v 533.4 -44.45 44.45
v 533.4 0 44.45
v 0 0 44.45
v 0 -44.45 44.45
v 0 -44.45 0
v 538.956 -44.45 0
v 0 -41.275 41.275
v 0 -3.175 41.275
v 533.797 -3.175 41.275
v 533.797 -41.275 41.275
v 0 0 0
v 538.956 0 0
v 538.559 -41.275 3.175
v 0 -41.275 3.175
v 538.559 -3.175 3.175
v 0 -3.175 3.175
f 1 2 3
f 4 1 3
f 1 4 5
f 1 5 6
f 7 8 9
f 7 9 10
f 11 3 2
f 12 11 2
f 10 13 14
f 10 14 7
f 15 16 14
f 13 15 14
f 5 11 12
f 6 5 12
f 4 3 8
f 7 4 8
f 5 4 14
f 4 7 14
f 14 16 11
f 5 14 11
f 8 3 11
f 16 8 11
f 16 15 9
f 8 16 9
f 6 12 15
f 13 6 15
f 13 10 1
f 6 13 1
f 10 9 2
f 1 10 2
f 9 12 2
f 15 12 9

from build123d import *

# Parameters (mm, degrees)
F1_DEPTH = 44.45
F2_W     = 38.1
F2_H     = 38.1
F3_DEPTH = 538.957237


with BuildPart() as f1:
    # F0 (on Front) → F1 (new body)
    with BuildSketch(Plane.XZ):
        Polygon((0, 44.45), (0, 0), (538.956237, 0), (533.4, 44.45), align=None)
    extrude(amount=F1_DEPTH)

    # F2 (on face) → F3 (cut, through all)
    with BuildSketch(Plane(origin=(0, 0, 0), x_dir=(0, -1, 0), z_dir=(-1, 0, 0))):
        with Locations((22.225, 22.225)):
            Rectangle(F2_W, F2_H)
    extrude(amount=-F3_DEPTH, mode=Mode.SUBTRACT)


solid = f1.part
